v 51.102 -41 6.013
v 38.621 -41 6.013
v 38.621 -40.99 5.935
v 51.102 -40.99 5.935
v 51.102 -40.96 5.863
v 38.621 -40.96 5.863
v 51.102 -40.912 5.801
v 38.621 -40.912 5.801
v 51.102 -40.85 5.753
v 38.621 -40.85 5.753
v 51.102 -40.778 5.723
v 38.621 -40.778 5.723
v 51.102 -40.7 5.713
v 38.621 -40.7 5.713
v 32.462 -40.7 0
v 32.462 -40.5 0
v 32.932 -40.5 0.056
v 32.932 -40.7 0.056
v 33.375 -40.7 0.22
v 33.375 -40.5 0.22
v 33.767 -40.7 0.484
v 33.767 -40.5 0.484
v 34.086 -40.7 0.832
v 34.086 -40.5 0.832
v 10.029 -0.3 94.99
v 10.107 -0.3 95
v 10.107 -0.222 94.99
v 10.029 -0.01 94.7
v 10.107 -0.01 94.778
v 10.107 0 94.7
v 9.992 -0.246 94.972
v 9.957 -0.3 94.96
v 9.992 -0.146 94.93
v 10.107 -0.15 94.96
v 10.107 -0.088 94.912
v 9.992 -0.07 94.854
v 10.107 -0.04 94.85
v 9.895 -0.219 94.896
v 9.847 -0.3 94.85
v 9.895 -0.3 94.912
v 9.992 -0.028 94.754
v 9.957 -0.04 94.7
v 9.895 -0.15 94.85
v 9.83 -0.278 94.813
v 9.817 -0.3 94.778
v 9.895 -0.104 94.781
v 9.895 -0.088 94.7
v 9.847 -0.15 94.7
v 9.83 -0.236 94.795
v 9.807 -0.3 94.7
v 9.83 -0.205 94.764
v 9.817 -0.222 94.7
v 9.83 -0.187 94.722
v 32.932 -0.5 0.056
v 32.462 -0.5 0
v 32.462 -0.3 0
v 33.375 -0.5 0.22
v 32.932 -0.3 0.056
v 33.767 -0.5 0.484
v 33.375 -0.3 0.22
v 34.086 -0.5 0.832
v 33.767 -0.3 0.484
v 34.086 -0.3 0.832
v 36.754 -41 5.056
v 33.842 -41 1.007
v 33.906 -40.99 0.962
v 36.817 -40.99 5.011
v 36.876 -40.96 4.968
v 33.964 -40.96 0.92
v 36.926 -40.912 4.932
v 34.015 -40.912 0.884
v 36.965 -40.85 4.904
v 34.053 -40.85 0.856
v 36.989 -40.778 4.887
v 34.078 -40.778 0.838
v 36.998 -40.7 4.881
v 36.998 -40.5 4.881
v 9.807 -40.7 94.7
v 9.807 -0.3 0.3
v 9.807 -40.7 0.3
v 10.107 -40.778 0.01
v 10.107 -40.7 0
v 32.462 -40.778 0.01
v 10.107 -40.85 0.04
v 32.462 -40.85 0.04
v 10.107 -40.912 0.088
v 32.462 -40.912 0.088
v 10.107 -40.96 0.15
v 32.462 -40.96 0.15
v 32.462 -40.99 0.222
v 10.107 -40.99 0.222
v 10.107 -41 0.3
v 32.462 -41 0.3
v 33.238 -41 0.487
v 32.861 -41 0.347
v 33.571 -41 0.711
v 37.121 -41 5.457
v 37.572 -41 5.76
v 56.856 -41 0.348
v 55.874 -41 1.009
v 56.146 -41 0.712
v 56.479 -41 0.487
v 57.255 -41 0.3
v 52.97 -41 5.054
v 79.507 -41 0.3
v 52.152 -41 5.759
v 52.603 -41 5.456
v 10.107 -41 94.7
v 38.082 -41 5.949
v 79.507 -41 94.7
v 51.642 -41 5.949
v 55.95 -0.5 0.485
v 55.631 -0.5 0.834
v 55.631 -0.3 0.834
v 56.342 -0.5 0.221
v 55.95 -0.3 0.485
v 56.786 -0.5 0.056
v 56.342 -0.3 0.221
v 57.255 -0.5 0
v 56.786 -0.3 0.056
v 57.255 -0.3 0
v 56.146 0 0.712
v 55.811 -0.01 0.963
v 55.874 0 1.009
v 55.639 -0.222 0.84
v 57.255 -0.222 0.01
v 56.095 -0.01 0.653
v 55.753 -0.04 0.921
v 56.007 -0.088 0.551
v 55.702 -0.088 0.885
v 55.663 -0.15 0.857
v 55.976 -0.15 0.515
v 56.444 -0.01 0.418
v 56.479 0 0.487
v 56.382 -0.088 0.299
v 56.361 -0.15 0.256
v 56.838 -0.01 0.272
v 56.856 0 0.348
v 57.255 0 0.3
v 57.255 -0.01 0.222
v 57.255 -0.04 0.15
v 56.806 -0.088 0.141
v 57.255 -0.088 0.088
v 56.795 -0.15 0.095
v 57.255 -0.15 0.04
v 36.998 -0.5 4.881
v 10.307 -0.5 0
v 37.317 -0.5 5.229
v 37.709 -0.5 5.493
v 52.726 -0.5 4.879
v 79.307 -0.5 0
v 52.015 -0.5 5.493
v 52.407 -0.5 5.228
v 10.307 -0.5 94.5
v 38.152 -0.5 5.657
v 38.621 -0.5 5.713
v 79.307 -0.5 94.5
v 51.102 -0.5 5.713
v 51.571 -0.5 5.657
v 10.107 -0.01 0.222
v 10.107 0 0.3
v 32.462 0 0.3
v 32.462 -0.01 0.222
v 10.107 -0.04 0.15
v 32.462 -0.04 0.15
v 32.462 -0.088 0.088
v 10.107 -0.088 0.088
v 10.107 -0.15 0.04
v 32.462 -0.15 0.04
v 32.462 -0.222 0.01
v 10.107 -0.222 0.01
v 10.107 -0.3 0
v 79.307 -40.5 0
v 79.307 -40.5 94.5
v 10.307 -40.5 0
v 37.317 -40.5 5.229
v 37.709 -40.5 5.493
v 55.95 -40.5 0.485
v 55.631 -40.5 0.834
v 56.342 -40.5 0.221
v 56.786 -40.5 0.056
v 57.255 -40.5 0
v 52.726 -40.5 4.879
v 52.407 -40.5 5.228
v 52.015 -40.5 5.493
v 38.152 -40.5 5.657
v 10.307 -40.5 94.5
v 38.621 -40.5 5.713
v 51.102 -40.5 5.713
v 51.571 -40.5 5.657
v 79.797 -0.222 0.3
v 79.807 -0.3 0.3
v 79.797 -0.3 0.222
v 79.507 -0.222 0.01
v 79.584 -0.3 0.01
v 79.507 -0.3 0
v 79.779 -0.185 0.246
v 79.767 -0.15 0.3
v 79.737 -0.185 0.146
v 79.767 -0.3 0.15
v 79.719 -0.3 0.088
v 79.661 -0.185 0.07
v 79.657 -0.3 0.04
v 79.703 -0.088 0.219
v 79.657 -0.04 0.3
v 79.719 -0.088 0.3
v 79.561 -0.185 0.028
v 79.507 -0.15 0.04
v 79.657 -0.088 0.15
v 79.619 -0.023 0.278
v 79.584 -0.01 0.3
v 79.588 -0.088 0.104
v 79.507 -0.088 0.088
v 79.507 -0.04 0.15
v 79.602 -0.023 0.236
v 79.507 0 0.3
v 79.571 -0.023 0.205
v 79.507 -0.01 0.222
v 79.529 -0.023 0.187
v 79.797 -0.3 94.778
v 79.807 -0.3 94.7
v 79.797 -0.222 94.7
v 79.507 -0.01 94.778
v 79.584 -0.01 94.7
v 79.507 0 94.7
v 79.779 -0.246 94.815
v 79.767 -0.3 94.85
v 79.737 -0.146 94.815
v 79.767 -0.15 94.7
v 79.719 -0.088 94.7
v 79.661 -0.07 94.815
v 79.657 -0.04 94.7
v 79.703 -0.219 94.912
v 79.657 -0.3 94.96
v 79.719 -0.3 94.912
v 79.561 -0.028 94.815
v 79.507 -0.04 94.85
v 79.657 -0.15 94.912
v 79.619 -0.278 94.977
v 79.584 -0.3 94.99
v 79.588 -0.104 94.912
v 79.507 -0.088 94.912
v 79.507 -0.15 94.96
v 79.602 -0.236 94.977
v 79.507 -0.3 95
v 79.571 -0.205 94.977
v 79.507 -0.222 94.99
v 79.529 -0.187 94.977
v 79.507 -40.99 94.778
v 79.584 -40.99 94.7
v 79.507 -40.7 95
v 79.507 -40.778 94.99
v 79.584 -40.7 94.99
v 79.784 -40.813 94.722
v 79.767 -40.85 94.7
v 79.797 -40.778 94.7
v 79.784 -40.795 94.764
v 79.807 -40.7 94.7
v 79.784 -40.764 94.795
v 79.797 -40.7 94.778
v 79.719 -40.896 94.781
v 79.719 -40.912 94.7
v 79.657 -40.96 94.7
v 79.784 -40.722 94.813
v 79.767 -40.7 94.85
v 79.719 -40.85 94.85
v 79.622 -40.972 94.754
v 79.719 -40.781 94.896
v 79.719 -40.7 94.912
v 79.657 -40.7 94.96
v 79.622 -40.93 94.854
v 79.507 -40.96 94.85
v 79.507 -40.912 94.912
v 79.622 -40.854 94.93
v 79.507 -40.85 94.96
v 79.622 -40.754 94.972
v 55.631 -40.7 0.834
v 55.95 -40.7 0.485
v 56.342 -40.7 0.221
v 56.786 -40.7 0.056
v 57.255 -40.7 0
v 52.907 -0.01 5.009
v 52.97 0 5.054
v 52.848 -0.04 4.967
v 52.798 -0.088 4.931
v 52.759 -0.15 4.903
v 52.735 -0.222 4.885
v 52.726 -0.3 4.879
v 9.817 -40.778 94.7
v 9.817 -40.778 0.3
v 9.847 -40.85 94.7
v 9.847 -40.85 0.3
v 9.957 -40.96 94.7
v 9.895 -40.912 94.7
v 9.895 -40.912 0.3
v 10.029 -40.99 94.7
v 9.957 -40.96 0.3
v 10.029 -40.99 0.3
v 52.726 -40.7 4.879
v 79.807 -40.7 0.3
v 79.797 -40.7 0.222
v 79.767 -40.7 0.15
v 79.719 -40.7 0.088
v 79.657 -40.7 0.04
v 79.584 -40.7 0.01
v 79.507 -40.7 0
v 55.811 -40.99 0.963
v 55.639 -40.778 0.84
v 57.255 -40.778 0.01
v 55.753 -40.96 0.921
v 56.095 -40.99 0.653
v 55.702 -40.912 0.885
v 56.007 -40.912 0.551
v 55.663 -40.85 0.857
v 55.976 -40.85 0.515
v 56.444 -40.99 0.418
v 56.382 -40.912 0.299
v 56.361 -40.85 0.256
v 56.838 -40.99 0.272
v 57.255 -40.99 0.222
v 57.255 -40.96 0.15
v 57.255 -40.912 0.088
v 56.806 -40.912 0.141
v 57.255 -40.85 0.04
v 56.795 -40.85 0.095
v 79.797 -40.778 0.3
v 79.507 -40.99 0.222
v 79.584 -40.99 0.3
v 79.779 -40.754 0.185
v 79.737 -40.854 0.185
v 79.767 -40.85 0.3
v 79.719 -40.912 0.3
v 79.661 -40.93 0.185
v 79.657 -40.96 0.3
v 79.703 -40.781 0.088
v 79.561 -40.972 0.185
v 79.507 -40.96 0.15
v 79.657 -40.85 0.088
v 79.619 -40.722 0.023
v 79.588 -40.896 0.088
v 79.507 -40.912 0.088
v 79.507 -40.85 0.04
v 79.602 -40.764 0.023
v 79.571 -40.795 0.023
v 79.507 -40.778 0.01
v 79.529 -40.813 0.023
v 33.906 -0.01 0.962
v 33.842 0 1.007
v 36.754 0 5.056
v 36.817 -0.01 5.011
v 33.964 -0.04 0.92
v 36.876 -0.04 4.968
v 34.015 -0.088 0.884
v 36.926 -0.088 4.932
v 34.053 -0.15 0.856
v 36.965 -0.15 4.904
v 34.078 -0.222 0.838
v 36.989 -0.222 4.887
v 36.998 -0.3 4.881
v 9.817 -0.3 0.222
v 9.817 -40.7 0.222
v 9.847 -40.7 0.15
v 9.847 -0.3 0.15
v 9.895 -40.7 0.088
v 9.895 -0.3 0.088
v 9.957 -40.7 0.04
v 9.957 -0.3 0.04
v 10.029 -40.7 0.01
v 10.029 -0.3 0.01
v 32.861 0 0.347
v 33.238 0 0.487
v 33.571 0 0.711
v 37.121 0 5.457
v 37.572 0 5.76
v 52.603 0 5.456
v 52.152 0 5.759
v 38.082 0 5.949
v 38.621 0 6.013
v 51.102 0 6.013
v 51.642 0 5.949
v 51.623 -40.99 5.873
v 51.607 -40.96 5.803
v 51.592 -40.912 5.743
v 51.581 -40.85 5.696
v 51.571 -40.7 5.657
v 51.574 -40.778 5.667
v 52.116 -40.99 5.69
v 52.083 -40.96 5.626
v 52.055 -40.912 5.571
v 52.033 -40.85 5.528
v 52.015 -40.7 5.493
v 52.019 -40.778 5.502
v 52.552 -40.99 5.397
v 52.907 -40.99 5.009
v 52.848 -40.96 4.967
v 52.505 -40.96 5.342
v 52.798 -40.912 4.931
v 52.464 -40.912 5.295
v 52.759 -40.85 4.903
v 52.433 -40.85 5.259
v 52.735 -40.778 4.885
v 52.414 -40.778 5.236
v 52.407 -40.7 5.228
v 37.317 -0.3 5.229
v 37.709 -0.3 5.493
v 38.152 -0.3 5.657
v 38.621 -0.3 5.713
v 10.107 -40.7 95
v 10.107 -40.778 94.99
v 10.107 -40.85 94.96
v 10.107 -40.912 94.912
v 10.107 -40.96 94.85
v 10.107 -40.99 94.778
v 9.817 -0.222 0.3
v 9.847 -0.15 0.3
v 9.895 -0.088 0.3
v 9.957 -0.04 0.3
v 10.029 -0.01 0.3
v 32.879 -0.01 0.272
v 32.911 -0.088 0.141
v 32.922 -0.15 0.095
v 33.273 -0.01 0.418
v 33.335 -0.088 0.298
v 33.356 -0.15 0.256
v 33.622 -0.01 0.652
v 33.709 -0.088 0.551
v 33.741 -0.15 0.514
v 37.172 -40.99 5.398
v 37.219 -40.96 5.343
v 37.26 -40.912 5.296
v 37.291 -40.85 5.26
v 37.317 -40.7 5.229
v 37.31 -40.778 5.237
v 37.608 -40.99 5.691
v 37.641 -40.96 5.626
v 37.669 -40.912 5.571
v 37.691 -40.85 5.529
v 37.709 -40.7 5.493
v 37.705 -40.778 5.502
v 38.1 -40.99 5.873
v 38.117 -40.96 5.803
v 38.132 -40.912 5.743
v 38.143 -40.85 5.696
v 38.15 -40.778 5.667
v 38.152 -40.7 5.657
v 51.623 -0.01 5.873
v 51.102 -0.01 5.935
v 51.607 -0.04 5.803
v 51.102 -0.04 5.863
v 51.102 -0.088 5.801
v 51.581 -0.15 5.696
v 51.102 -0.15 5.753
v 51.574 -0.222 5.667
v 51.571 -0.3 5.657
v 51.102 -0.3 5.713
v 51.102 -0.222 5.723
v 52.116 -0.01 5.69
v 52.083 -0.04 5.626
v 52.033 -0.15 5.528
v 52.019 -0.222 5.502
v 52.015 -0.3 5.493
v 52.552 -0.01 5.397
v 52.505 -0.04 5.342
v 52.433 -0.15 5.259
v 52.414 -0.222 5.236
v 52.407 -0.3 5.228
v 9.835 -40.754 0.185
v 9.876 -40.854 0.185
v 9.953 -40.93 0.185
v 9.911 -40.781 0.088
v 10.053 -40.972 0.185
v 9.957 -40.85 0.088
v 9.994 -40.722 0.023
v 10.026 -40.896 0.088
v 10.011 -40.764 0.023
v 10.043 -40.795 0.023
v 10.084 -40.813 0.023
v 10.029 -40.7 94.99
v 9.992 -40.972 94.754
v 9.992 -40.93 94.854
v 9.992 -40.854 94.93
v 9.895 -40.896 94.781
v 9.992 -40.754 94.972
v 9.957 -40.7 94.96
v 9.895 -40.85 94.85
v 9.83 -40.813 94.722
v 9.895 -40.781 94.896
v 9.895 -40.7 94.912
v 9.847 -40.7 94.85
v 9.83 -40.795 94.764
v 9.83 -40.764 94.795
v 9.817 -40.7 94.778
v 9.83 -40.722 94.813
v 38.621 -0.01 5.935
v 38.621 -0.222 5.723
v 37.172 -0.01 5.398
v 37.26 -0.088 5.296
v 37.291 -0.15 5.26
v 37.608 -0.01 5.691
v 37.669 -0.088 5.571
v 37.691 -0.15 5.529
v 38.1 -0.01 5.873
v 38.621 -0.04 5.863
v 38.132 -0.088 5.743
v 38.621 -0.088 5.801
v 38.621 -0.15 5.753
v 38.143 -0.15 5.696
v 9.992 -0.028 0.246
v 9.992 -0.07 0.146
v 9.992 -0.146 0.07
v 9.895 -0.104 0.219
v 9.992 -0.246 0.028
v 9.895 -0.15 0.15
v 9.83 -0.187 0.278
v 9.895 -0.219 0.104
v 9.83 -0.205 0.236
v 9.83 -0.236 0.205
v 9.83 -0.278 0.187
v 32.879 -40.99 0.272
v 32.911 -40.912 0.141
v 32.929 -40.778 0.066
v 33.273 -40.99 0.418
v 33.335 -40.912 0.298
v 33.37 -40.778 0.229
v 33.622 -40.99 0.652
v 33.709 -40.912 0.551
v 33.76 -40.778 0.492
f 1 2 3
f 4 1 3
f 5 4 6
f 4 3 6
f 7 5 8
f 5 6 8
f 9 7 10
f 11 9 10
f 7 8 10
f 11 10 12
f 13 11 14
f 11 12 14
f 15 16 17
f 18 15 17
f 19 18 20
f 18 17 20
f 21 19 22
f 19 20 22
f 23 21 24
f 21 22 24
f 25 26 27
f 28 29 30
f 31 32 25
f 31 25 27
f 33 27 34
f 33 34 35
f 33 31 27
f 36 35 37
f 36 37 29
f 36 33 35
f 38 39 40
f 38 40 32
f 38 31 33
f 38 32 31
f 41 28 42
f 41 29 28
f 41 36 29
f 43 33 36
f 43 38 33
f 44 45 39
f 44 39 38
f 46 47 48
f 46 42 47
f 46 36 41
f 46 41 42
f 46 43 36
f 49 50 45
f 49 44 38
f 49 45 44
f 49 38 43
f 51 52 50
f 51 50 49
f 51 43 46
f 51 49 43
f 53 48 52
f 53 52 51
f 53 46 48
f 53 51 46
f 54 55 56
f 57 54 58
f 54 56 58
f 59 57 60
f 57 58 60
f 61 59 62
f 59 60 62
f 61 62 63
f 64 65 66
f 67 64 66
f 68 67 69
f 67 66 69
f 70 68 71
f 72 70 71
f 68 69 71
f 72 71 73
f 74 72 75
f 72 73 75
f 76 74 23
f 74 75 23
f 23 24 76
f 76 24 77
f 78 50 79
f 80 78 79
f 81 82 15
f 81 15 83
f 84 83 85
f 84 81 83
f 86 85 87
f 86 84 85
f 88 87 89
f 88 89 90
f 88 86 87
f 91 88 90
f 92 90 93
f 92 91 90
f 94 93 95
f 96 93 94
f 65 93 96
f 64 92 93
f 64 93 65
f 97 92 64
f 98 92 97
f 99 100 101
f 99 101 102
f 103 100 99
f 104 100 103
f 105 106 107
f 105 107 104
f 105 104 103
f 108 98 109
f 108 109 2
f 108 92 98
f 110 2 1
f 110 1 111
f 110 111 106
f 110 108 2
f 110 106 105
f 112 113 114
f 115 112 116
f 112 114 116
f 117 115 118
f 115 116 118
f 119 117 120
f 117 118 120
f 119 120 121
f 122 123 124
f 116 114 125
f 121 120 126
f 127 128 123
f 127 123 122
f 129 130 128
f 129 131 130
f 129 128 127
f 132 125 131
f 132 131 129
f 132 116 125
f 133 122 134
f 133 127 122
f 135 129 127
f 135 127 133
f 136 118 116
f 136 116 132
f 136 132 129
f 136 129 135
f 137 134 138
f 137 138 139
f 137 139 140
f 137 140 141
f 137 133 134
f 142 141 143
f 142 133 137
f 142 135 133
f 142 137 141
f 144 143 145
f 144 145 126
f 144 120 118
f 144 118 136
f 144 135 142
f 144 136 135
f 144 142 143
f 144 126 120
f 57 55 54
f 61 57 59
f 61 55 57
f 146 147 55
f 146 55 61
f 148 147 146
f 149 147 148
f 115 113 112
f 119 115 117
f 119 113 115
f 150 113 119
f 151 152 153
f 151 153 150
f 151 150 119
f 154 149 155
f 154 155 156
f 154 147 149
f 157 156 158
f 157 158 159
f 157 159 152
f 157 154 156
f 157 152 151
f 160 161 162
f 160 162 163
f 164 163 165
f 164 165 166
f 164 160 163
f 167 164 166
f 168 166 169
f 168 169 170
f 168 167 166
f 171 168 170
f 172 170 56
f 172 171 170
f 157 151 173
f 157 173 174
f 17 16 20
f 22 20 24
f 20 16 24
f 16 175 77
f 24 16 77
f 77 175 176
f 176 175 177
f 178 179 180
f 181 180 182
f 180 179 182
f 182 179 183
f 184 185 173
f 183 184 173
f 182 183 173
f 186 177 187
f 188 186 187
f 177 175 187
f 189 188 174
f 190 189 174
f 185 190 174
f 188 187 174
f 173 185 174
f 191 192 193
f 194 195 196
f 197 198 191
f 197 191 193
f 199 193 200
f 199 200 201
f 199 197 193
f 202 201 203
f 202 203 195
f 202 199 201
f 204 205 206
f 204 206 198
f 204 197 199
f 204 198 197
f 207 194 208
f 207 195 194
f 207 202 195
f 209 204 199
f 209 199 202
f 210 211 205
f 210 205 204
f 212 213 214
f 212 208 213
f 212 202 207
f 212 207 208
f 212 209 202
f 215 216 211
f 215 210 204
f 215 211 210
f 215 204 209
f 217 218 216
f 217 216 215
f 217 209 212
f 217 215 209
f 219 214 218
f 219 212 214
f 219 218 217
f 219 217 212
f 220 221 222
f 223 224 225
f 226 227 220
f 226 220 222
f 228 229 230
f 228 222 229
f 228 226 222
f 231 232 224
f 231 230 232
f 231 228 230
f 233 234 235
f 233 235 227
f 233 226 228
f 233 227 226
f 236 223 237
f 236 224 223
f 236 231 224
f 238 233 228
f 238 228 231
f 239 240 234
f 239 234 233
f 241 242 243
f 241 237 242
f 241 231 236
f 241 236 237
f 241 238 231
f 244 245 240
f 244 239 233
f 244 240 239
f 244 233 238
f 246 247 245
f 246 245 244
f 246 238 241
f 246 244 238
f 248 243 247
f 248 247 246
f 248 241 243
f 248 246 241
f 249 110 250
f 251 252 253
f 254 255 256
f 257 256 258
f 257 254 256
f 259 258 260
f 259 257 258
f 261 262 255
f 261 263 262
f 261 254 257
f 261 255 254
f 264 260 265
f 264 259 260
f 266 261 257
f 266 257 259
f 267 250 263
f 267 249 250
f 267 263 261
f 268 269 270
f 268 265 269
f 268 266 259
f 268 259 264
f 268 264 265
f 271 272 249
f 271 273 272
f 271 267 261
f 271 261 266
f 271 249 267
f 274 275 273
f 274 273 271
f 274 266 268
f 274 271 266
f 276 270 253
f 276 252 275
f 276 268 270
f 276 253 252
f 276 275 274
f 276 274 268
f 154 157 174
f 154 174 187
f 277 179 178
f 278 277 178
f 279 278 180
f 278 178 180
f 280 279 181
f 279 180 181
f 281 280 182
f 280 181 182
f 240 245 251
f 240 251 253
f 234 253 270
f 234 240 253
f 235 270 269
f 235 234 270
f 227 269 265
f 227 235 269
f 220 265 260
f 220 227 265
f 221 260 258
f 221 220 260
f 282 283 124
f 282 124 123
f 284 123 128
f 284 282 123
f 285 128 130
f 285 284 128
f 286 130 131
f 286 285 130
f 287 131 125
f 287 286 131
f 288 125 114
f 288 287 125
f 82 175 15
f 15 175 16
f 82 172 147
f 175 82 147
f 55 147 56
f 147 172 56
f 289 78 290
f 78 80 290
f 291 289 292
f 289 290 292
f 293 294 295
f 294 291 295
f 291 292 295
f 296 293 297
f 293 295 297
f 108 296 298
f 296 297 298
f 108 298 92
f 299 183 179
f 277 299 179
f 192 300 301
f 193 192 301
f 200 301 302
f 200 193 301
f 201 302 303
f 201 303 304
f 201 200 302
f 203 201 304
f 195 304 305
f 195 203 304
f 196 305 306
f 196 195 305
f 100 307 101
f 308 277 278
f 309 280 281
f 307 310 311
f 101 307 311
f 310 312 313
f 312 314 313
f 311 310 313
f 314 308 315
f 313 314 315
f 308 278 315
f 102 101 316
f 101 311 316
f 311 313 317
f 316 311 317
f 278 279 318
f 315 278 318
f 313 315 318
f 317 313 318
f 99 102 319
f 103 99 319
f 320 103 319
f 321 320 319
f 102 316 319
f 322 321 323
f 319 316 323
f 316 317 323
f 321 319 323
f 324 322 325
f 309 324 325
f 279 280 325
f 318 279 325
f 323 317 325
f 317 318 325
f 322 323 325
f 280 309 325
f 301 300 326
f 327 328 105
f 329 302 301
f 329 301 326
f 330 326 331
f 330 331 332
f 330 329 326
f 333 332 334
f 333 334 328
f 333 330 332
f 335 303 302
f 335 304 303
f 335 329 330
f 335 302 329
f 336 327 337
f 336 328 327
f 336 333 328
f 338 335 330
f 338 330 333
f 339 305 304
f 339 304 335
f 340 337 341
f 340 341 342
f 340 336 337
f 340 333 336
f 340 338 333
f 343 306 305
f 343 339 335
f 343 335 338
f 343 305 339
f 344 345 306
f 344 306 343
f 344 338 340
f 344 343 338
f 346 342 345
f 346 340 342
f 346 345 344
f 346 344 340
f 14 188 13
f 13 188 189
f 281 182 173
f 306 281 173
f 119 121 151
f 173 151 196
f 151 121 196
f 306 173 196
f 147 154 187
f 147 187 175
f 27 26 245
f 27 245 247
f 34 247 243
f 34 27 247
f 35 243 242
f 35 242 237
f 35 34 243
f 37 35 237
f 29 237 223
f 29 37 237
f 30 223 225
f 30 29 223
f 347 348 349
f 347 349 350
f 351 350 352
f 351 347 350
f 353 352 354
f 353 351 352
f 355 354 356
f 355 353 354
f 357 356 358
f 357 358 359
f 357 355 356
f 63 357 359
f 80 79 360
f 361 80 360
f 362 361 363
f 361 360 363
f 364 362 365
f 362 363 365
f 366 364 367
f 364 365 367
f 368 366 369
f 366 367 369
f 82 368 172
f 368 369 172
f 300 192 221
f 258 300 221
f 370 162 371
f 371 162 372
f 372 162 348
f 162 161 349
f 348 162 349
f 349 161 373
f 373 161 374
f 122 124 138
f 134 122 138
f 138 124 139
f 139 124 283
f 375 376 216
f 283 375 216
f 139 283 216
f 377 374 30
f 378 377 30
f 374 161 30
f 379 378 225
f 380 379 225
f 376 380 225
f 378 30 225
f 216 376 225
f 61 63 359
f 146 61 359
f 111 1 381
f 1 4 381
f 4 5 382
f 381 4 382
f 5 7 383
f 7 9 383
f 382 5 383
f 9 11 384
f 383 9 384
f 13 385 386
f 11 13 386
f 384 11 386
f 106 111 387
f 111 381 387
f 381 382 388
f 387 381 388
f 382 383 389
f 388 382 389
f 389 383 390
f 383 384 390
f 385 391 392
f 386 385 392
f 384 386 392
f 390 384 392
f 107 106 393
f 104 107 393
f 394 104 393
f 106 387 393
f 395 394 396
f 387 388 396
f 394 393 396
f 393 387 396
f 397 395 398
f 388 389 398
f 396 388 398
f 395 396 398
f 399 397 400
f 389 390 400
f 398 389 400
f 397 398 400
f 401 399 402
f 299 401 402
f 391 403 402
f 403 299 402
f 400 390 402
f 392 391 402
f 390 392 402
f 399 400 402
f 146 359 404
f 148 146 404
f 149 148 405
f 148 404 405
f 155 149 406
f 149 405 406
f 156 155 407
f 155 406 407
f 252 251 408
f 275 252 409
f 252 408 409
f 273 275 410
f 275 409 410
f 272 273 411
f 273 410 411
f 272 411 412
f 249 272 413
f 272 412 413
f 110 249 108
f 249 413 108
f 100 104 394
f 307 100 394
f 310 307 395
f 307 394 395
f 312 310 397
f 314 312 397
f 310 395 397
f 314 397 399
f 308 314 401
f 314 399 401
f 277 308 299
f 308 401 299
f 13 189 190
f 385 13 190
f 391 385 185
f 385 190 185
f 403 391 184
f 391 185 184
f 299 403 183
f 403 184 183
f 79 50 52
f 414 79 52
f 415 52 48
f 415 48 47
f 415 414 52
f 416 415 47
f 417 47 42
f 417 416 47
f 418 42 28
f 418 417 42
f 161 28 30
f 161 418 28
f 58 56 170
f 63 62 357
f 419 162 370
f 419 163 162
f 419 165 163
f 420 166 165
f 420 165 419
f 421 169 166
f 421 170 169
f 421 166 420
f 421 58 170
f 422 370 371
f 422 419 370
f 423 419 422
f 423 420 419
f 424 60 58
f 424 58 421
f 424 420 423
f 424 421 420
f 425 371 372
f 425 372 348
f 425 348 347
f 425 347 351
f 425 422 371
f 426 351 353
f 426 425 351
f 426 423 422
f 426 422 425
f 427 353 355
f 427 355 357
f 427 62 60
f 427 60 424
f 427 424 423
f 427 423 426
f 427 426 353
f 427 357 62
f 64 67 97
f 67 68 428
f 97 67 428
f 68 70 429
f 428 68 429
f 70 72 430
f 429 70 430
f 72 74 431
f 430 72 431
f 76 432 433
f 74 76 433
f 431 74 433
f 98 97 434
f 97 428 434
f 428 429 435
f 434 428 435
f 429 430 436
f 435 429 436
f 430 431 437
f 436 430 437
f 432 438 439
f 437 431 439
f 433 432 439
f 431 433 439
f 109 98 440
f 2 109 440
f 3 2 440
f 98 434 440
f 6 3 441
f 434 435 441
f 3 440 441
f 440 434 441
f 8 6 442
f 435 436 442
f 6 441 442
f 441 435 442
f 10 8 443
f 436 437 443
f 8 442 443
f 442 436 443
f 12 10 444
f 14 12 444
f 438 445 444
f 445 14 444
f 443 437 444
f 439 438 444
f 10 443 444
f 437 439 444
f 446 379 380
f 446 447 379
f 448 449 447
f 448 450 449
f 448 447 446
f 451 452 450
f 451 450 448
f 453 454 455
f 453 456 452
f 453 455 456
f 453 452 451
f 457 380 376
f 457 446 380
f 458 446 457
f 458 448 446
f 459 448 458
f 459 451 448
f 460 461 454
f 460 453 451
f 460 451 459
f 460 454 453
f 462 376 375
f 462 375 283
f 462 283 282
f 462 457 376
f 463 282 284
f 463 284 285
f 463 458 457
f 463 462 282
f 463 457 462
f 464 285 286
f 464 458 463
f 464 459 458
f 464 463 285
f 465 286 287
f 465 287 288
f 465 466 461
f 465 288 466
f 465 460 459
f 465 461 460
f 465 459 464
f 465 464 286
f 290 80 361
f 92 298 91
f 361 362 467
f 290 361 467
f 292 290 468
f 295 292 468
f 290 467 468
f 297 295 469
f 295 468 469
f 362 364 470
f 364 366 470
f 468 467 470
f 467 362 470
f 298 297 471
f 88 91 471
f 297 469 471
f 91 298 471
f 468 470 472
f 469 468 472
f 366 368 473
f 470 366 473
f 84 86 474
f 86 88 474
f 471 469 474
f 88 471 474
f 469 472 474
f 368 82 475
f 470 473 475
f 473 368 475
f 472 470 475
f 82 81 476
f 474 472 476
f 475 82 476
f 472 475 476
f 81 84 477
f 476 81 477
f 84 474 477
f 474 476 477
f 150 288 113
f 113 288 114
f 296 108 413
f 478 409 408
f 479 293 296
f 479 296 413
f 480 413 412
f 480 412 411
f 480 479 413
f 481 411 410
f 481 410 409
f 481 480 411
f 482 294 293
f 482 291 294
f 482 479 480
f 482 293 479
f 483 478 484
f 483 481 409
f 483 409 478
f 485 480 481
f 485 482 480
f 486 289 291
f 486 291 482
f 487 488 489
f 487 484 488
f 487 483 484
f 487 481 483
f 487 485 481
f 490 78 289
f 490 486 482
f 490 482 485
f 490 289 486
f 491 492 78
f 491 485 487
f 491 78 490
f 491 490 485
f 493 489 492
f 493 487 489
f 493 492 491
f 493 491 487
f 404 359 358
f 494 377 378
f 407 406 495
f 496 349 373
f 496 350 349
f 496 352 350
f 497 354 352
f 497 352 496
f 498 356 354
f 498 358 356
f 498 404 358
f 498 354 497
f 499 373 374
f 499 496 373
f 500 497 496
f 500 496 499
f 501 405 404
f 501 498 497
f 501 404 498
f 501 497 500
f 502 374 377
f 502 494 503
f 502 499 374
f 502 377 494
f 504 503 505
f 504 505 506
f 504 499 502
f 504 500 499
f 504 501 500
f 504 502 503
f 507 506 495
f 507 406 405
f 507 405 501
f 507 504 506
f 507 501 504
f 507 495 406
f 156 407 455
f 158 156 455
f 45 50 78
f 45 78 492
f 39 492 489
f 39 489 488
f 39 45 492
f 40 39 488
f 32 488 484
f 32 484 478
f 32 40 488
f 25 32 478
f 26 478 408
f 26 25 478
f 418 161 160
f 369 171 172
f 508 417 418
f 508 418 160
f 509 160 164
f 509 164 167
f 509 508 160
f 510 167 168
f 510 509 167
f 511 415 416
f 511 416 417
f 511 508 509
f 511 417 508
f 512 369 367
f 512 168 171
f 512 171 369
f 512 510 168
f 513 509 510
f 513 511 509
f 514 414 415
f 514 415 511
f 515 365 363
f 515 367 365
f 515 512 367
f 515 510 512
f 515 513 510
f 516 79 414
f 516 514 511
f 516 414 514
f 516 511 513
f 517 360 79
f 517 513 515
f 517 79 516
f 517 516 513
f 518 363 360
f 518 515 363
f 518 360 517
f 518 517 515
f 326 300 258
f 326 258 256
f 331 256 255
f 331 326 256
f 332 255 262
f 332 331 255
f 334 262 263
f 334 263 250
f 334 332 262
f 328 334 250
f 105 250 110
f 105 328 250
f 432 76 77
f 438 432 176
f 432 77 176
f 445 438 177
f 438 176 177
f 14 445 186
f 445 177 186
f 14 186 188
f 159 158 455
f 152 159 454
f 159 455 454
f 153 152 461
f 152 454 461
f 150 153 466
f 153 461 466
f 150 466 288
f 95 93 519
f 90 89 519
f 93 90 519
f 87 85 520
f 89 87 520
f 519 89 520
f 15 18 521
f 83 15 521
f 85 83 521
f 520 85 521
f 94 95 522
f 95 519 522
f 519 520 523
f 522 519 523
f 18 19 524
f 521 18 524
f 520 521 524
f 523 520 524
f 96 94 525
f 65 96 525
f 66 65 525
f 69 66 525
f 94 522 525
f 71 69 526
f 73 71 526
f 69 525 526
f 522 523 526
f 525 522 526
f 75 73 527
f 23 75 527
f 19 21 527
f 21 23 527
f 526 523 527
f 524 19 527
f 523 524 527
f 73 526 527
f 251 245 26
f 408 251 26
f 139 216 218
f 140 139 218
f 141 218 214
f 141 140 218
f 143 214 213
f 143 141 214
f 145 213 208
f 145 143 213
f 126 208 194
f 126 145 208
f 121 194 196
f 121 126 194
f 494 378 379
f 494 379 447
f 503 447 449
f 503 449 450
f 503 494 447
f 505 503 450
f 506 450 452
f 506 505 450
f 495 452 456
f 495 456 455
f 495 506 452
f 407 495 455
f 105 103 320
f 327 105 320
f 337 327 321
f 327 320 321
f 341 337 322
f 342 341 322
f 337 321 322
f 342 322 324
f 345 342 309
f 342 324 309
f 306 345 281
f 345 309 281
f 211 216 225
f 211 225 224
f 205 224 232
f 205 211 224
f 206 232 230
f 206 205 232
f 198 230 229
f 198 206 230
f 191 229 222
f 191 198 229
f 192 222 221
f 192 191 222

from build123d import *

# Parameters (mm, degrees)
F1_DEPTH     = 41
F2_T         = -0.5
F3_R         = 0.3
F4_T1_DEPTH  = 40.4
F4_T3_DEPTH  = 69.4
F4_T5_DEPTH  = 94.4
F4_T7_DEPTH  = 22.3555421914
F4_T9_DEPTH  = 4.9869624773
F4_T11_DEPTH = 22.2513779286
F4_T13_DEPTH = 12.4801482885
F4_T15_DEPTH = 4.9803706459
F4_S19_W     = 0.3
F4_S19_H     = 0.3
F4_T20_DEPTH = 0.3
F4_S25_W     = 0.3
F4_S25_H     = 0.3
F4_T26_DEPTH = 0.3
F4_S31_W     = 0.3
F4_S31_H     = 0.3
F4_T32_DEPTH = 0.3
F4_S37_W     = 0.3
F4_S37_H     = 0.3
F4_T38_DEPTH = 0.3
F4_S43_W     = 0.3
F4_S43_H     = 0.3
F4_T44_DEPTH = 0.3
F4_S49_W     = 0.3
F4_S49_H     = 0.3
F4_T50_DEPTH = 0.3
F4_T54_ANGLE = 54.2765520119
F4_T56_ANGLE = 54.2765520119
F4_T58_ANGLE = 54.2765520119
F4_T60_ANGLE = 54.3263722655
F4_T62_ANGLE = 54.3263722655
F4_T64_ANGLE = 54.3263722655
F4_T66_ANGLE = 54.3263722655
F4_T68_ANGLE = 54.2765520119
F4_T70_ANGLE = 90
F4_T72_ANGLE = 90


# Not quite as in the source:
# - a fillet or chamfer that OpenCascade refuses, or shapes differently, is made with other operations: its cross-section is extruded or revolved along the edge and cut away or added
# - a feature names something its author has since deleted; it is built from what else it names


with BuildPart() as f1:
    # F0 (on Front) → F1 (new body)
    with BuildSketch(Plane.XZ):
        with BuildLine():
            Line((9.8067959771, 95), (9.8067959771, 0))
            Line((9.8067959771, 0), (32.4623381684, 0))
            ThreePointArc((32.4623381684, 0), (33.3746171792, 0.2201834346), (34.086027464, 0.8322529934))
            Line((34.086027464, 0.8322529934), (36.9977827164, 4.8808917895))
            ThreePointArc((36.9977827164, 4.8808917895), (37.7091930013, 5.4929613484), (38.621472012, 5.7131447829))
            Line((38.621472012, 5.7131447829), (44.8583289981, 5.7131447829))
            Line((44.8583289981, 5.7131447829), (51.1016203005, 5.7131447829))
            ThreePointArc((51.1016203005, 5.7131447829), (52.0146730247, 5.4925645543), (52.7263243702, 4.8794795058))
            Line((52.7263243702, 4.8794795058), (55.6307139787, 0.8336652772))
            ThreePointArc((55.6307139787, 0.8336652772), (56.3423653243, 0.2205802286), (57.2554180484, 0))
            Line((57.2554180484, 0), (79.8067959771, 0))
            Line((79.8067959771, 0), (79.8067959771, 95))
            Line((79.8067959771, 95), (9.8067959771, 95))
        make_face()
    extrude(amount=F1_DEPTH)

    # F2
    f2_openings = [f1.faces().sort_by_distance(p)[0] for p in [
        (21.134567, -20.5, 0),
        (33.374617, -20.5, 0.220183),
        (35.541905, -20.5, 2.856572),
        (37.709193, -20.5, 5.492961),
        (44.861546, -20.5, 5.713145),
        (52.014673, -20.5, 5.492565),
        (56.342365, -20.5, 0.22058),
        (68.531107, -20.5, 0),
        (54.178519, -20.5, 2.856572),
    ]]
    offset(amount=F2_T, openings=f2_openings)

    # F3
    f3_edges = [f1.edges().sort_by_distance(p)[0] for p in [
        (44.806796, -41, 95),
        (9.806796, -41, 47.5),
    ]]
    fillet(f3_edges, radius=F3_R)

    # F4: fillet of radius 0.3 on 11 edges, made by hand

    # F4_s2 → F4_t1 (cut)
    with BuildSketch(Plane.XZ.offset(0.3)):
        with BuildLine():
            ThreePointArc((9.8067959771, 94.7), (9.8946639427, 94.9121320344), (10.1067959771, 95))
            Line((10.1067959771, 95), (9.8067959771, 95))
            Line((9.8067959771, 95), (9.8067959771, 94.7))
        make_face()
        with BuildLine():
            ThreePointArc((79.5067959771, 95), (79.7189280114, 94.9121320344), (79.8067959771, 94.7))
            Line((79.8067959771, 94.7), (79.8067959771, 95))
            Line((79.8067959771, 95), (79.5067959771, 95))
        make_face()
        with BuildLine():
            ThreePointArc((79.8067959771, 0.3), (79.7189280114, 0.0878679656), (79.5067959771, 0))
            Line((79.5067959771, 0), (79.8067959771, 0))
            Line((79.8067959771, 0), (79.8067959771, 0.3))
        make_face()
        with BuildLine():
            ThreePointArc((9.8067959771, 0.3), (9.8946639427, 0.0878679656), (10.1067959771, 0))
            Line((10.1067959771, 0), (9.8067959771, 0))
            Line((9.8067959771, 0), (9.8067959771, 0.3))
        make_face()
    extrude(amount=F4_T1_DEPTH, mode=Mode.SUBTRACT)

    # F4_s4 → F4_t3 (cut)
    with BuildSketch(Plane.YZ.offset(10.1067959771)):
        with BuildLine():
            ThreePointArc((-0.3, 95), (-0.0878679656, 94.9121320344), (0, 94.7))
            Line((0, 94.7), (0, 95))
            Line((0, 95), (-0.3, 95))
        make_face()
    extrude(amount=F4_T3_DEPTH, mode=Mode.SUBTRACT)

    # F4_s6 → F4_t5 (cut)
    with BuildSketch(Plane.XY.offset(0.3)):
        with BuildLine():
            ThreePointArc((9.8067959771, -0.3), (9.8946639427, -0.0878679656), (10.1067959771, 0))
            Line((10.1067959771, 0), (9.8067959771, 0))
            Line((9.8067959771, 0), (9.8067959771, -0.3))
        make_face()
        with BuildLine():
            ThreePointArc((79.5067959771, 0), (79.7189280114, -0.0878679656), (79.8067959771, -0.3))
            Line((79.8067959771, -0.3), (79.8067959771, 0))
            Line((79.8067959771, 0), (79.5067959771, 0))
        make_face()
        with BuildLine():
            ThreePointArc((79.8067959771, -40.7), (79.7189280114, -40.9121320344), (79.5067959771, -41))
            Line((79.5067959771, -41), (79.8067959771, -41))
            Line((79.8067959771, -41), (79.8067959771, -40.7))
        make_face()
    extrude(amount=F4_T5_DEPTH, mode=Mode.SUBTRACT)

    # F4_s8 → F4_t7 (cut)
    with BuildSketch(Plane.YZ.offset(10.1067959771)):
        with BuildLine():
            ThreePointArc((-40.7, 0), (-40.9121320344, 0.0878679656), (-41, 0.3))
            Line((-41, 0.3), (-41, 0))
            Line((-41, 0), (-40.7, 0))
        make_face()
        with BuildLine():
            ThreePointArc((0, 0.3), (-0.0878679656, 0.0878679656), (-0.3, 0))
            Line((-0.3, 0), (0, 0))
            Line((0, 0), (0, 0.3))
        make_face()
    extrude(amount=F4_T7_DEPTH, mode=Mode.SUBTRACT)

    # F4_s10 → F4_t9 (cut)
    with BuildSketch(Plane(origin=(12.0147086319, 0, 16.7058050126), x_dir=(0, 1, 0), z_dir=(0.5838735033, 0, 0.8118446478))):
        with BuildLine():
            ThreePointArc((-41, -26.8866284908), (-40.9121320344, -27.0987605251), (-40.7, -27.1866284908))
            Line((-40.7, -27.1866284908), (-41, -27.1866284908))
            Line((-41, -27.1866284908), (-41, -26.8866284908))
        make_face()
        with BuildLine():
            ThreePointArc((0, -26.8866284908), (-0.0878679656, -27.0987605251), (-0.3, -27.1866284908))
            Line((-0.3, -27.1866284908), (0, -27.1866284908))
            Line((0, -27.1866284908), (0, -26.8866284908))
        make_face()
    extrude(amount=F4_T9_DEPTH, mode=Mode.SUBTRACT)

    # F4_s12 → F4_t11 (cut)
    with BuildSketch(Plane.YZ.offset(57.2554180484)):
        with BuildLine():
            ThreePointArc((-41, 0.3), (-40.9121320344, 0.0878679656), (-40.7, 0))
            Line((-40.7, 0), (-41, 0))
            Line((-41, 0), (-41, 0.3))
        make_face()
        with BuildLine():
            ThreePointArc((0, 0.3), (-0.0878679656, 0.0878679656), (-0.3, 0))
            Line((-0.3, 0), (0, 0))
            Line((0, 0), (0, 0.3))
        make_face()
    extrude(amount=F4_T11_DEPTH, mode=Mode.SUBTRACT)

    # F4_s14 → F4_t13 (cut)
    with BuildSketch(Plane.YZ.offset(38.621472012)):
        with BuildLine():
            ThreePointArc((0, 6.0131447829), (-0.0878679656, 5.8010127486), (-0.3, 5.7131447829))
            Line((-0.3, 5.7131447829), (0, 5.7131447829))
            Line((0, 5.7131447829), (0, 6.0131447829))
        make_face()
        with BuildLine():
            ThreePointArc((-41, 6.0131447829), (-40.9121320344, 5.8010127486), (-40.7, 5.7131447829))
            Line((-40.7, 5.7131447829), (-41, 5.7131447829))
            Line((-41, 5.7131447829), (-41, 6.0131447829))
        make_face()
    extrude(amount=F4_T13_DEPTH, mode=Mode.SUBTRACT)

    # F4_s16 → F4_t15 (cut)
    with BuildSketch(Plane(origin=(15.6197974129, 0, -21.7583751289), x_dir=(0, 1, 0), z_dir=(0.5831673614, 0, -0.8123520349))):
        with BuildLine():
            ThreePointArc((0, 45.9778900823), (-0.0878679656, 45.765758048), (-0.3, 45.6778900823))
            Line((-0.3, 45.6778900823), (0, 45.6778900823))
            Line((0, 45.6778900823), (0, 45.9778900823))
        make_face()
        with BuildLine():
            ThreePointArc((-41, 45.9778900823), (-40.9121320344, 45.765758048), (-40.7, 45.6778900823))
            Line((-40.7, 45.6778900823), (-41, 45.6778900823))
            Line((-41, 45.6778900823), (-41, 45.9778900823))
        make_face()
    extrude(amount=F4_T15_DEPTH, mode=Mode.SUBTRACT)


with BuildPart() as f4_tool18:
    # F4_s19 → F4_t20 (new body)
    with BuildSketch(Plane.YZ.offset(10.1067959771)):
        with Locations((-40.85, 94.85)):
            Rectangle(F4_S19_W, F4_S19_H)
    extrude(amount=-F4_T20_DEPTH)

    # F4_s21 → F4_t22 (revolve, cut)
    with BuildSketch(Plane(origin=(10.1067959771, -40.7, 94.7), x_dir=(0, 0.7071067812, -0.7071067812), z_dir=(0, 0.7071067812, 0.7071067812))):
        with BuildLine():
            ThreePointArc((0, -0.3), (0.3, 0), (0, 0.3))
            Line((0, 0.3), (0, -0.3))
        make_face()
    revolve(axis=Axis((10.1067959771, -40.7, 94.7), (-1, 0, 0)), mode=Mode.SUBTRACT)


with BuildPart() as f1_1:
    add(f1.part)

    # F4_t17: cut F4_tool18
    add(f4_tool18.part, mode=Mode.SUBTRACT)


with BuildPart() as f4_tool24:
    # F4_s25 → F4_t26 (new body)
    with BuildSketch(Plane.YZ.offset(10.1067959771)):
        with Locations((-0.15, 94.85)):
            Rectangle(F4_S25_W, F4_S25_H)
    extrude(amount=-F4_T26_DEPTH)

    # F4_s27 → F4_t28 (revolve, cut)
    with BuildSketch(Plane(origin=(10.1067959771, -0.3, 94.7), x_dir=(0, -0.7071067812, -0.7071067812), z_dir=(0, 0.7071067812, -0.7071067812))):
        with BuildLine():
            ThreePointArc((0, -0.3), (0.3, 0), (0, 0.3))
            Line((0, 0.3), (0, -0.3))
        make_face()
    revolve(axis=Axis((10.1067959771, -0.3, 94.7), (-1, 0, 0)), mode=Mode.SUBTRACT)


with BuildPart() as f1_2:
    add(f1_1.part)

    # F4_t23: cut F4_tool24
    add(f4_tool24.part, mode=Mode.SUBTRACT)


with BuildPart() as f4_tool30:
    # F4_s31 → F4_t32 (new body)
    with BuildSketch(Plane.XY.offset(94.7)):
        with Locations((79.6567959771, -0.15)):
            Rectangle(F4_S31_W, F4_S31_H)
    extrude(amount=F4_T32_DEPTH)

    # F4_s33 → F4_t34 (revolve, cut)
    with BuildSketch(Plane(origin=(79.5067959771, -0.3, 94.7), x_dir=(-0.7071067812, -0.7071067812, 0), z_dir=(-0.7071067812, 0.7071067812, 0))):
        with BuildLine():
            ThreePointArc((0, -0.3), (0.3, 0), (0, 0.3))
            Line((0, 0.3), (0, -0.3))
        make_face()
    revolve(axis=Axis((79.5067959771, -0.3, 94.7), (0, 0, 1)), mode=Mode.SUBTRACT)


with BuildPart() as f1_3:
    add(f1_2.part)

    # F4_t29: cut F4_tool30
    add(f4_tool30.part, mode=Mode.SUBTRACT)


with BuildPart() as f4_tool36:
    # F4_s37 → F4_t38 (new body)
    with BuildSketch(Plane.YZ.offset(10.1067959771)):
        with Locations((-0.15, 0.15)):
            Rectangle(F4_S37_W, F4_S37_H)
    extrude(amount=-F4_T38_DEPTH)

    # F4_s39 → F4_t40 (revolve, cut)
    with BuildSketch(Plane(origin=(10.1067959771, -0.3, 0.3), x_dir=(0, -0.7071067812, 0.7071067812), z_dir=(0, -0.7071067812, -0.7071067812))):
        with BuildLine():
            ThreePointArc((0, -0.3), (0.3, 0), (0, 0.3))
            Line((0, 0.3), (0, -0.3))
        make_face()
    revolve(axis=Axis((10.1067959771, -0.3, 0.3), (-1, 0, 0)), mode=Mode.SUBTRACT)


with BuildPart() as f1_4:
    add(f1_3.part)

    # F4_t35: cut F4_tool36
    add(f4_tool36.part, mode=Mode.SUBTRACT)


with BuildPart() as f4_tool42:
    # F4_s43 → F4_t44 (new body)
    with BuildSketch(Plane.XZ.offset(0.3)):
        with Locations((79.6567959771, 0.15)):
            Rectangle(F4_S43_W, F4_S43_H)
    extrude(amount=-F4_T44_DEPTH)

    # F4_s45 → F4_t46 (revolve, cut)
    with BuildSketch(Plane(origin=(79.5067959771, -0.3, 0.3), x_dir=(-0.7071067812, 0, 0.7071067812), z_dir=(-0.7071067812, 0, -0.7071067812))):
        with BuildLine():
            ThreePointArc((0, -0.3), (0.3, 0), (0, 0.3))
            Line((0, 0.3), (0, -0.3))
        make_face()
    revolve(axis=Axis((79.5067959771, -0.3, 0.3), (0, 1, 0)), mode=Mode.SUBTRACT)


with BuildPart() as f1_5:
    add(f1_4.part)

    # F4_t41: cut F4_tool42
    add(f4_tool42.part, mode=Mode.SUBTRACT)


with BuildPart() as f4_tool48:
    # F4_s49 → F4_t50 (new body)
    with BuildSketch(Plane.XY.offset(0.3)):
        with Locations((79.6567959771, -40.85)):
            Rectangle(F4_S49_W, F4_S49_H)
    extrude(amount=-F4_T50_DEPTH)

    # F4_s51 → F4_t52 (revolve, cut)
    with BuildSketch(Plane(origin=(79.5067959771, -40.7, 0.3), x_dir=(-0.7071067812, 0.7071067812, 0), z_dir=(-0.7071067812, -0.7071067812, 0))):
        with BuildLine():
            ThreePointArc((0, -0.3), (0.3, 0), (0, 0.3))
            Line((0, 0.3), (0, -0.3))
        make_face()
    revolve(axis=Axis((79.5067959771, -40.7, 0.3), (0, 0, -1)), mode=Mode.SUBTRACT)


with BuildPart() as f1_6:
    add(f1_5.part)

    # F4_t47: cut F4_tool48
    add(f4_tool48.part, mode=Mode.SUBTRACT)

    # F4_s53 → F4_t54 (revolve, cut)
    with BuildSketch(Plane.YZ.offset(32.4623381684)):
        with BuildLine():
            ThreePointArc((-41, 0.3), (-40.9121320344, 0.0878679656), (-40.7, 0))
            Line((-40.7, 0), (-41, 0))
            Line((-41, 0), (-41, 0.3))
        make_face()
    revolve(axis=Axis((32.4623381684, -41, 2), (0, -1, 0)), revolution_arc=F4_T54_ANGLE, mode=Mode.SUBTRACT)

    # F4_s55 → F4_t56 (revolve, cut)
    with BuildSketch(Plane.YZ.offset(32.4623381684)):
        with BuildLine():
            ThreePointArc((0, 0.3), (-0.0878679656, 0.0878679656), (-0.3, 0))
            Line((-0.3, 0), (0, 0))
            Line((0, 0), (0, 0.3))
        make_face()
    revolve(axis=Axis((32.4623381684, 0, 2), (0, -1, 0)), revolution_arc=F4_T56_ANGLE, mode=Mode.SUBTRACT)

    # F4_s57 → F4_t58 (revolve, cut)
    with BuildSketch(Plane(origin=(14.9264638842, 0, 20.7544438086), x_dir=(0, 1, 0), z_dir=(-0.5838735033, 0, -0.8118446478))):
        with BuildLine():
            ThreePointArc((0, 26.8866284908), (-0.0878679656, 27.0987605251), (-0.3, 27.1866284908))
            Line((-0.3, 27.1866284908), (0, 27.1866284908))
            Line((0, 27.1866284908), (0, 26.8866284908))
        make_face()
    revolve(axis=Axis((38.621472012, 0, 3.7131447829), (0, 1, 0)), revolution_arc=F4_T58_ANGLE, mode=Mode.SUBTRACT)

    # F4_s59 → F4_t60 (revolve, cut)
    with BuildSketch(Plane.YZ.offset(51.1016203005)):
        with BuildLine():
            ThreePointArc((0, 6.0131447829), (-0.0878679656, 5.8010127486), (-0.3, 5.7131447829))
            Line((-0.3, 5.7131447829), (0, 5.7131447829))
            Line((0, 5.7131447829), (0, 6.0131447829))
        make_face()
    revolve(axis=Axis((51.1016203005, 0, 3.7131447829), (0, 1, 0)), revolution_arc=F4_T60_ANGLE, mode=Mode.SUBTRACT)

    # F4_s61 → F4_t62 (revolve, cut)
    with BuildSketch(Plane(origin=(18.5241870214, 0, -25.8041893575), x_dir=(0, 1, 0), z_dir=(-0.5831673614, 0, 0.8123520349))):
        with BuildLine():
            ThreePointArc((0, -45.9778900823), (-0.0878679656, -45.765758048), (-0.3, -45.6778900823))
            Line((-0.3, -45.6778900823), (0, -45.6778900823))
            Line((0, -45.6778900823), (0, -45.9778900823))
        make_face()
    revolve(axis=Axis((57.2554180484, 0, 2), (0, -1, 0)), revolution_arc=F4_T62_ANGLE, mode=Mode.SUBTRACT)

    # F4_s63 → F4_t64 (revolve, cut)
    with BuildSketch(Plane(origin=(18.5241870214, 0, -25.8041893575), x_dir=(0, 1, 0), z_dir=(-0.5831673614, 0, 0.8123520349))):
        with BuildLine():
            ThreePointArc((-41, -45.9778900823), (-40.9121320344, -45.765758048), (-40.7, -45.6778900823))
            Line((-40.7, -45.6778900823), (-41, -45.6778900823))
            Line((-41, -45.6778900823), (-41, -45.9778900823))
        make_face()
    revolve(axis=Axis((57.2554180484, -41, 2), (0, -1, 0)), revolution_arc=F4_T64_ANGLE, mode=Mode.SUBTRACT)

    # F4_s65 → F4_t66 (revolve, cut)
    with BuildSketch(Plane.YZ.offset(51.1016203005)):
        with BuildLine():
            ThreePointArc((-41, 6.0131447829), (-40.9121320344, 5.8010127486), (-40.7, 5.7131447829))
            Line((-40.7, 5.7131447829), (-41, 5.7131447829))
            Line((-41, 5.7131447829), (-41, 6.0131447829))
        make_face()
    revolve(axis=Axis((51.1016203005, -41, 3.7131447829), (0, 1, 0)), revolution_arc=F4_T66_ANGLE, mode=Mode.SUBTRACT)

    # F4_s67 → F4_t68 (revolve, cut)
    with BuildSketch(Plane(origin=(14.9264638842, 0, 20.7544438086), x_dir=(0, 1, 0), z_dir=(-0.5838735033, 0, -0.8118446478))):
        with BuildLine():
            ThreePointArc((-41, 26.8866284908), (-40.9121320344, 27.0987605251), (-40.7, 27.1866284908))
            Line((-40.7, 27.1866284908), (-41, 27.1866284908))
            Line((-41, 27.1866284908), (-41, 26.8866284908))
        make_face()
    revolve(axis=Axis((38.621472012, -41, 3.7131447829), (0, 1, 0)), revolution_arc=F4_T68_ANGLE, mode=Mode.SUBTRACT)

    # F4_s69 → F4_t70 (revolve, cut)
    with BuildSketch(Plane.XZ.offset(40.7)):
        with BuildLine():
            ThreePointArc((9.8067959771, 0.3), (9.8946639427, 0.0878679656), (10.1067959771, 0))
            Line((10.1067959771, 0), (9.8067959771, 0))
            Line((9.8067959771, 0), (9.8067959771, 0.3))
        make_face()
    revolve(axis=Axis((10.1067959771, -40.7, 0), (0, 0, 1)), revolution_arc=F4_T70_ANGLE, mode=Mode.SUBTRACT)

    # F4_s71 → F4_t72 (revolve, cut)
    with BuildSketch(Plane.XY.offset(94.7)):
        with BuildLine():
            ThreePointArc((79.8067959771, -40.7), (79.7189280114, -40.9121320344), (79.5067959771, -41))
            Line((79.5067959771, -41), (79.8067959771, -41))
            Line((79.8067959771, -41), (79.8067959771, -40.7))
        make_face()
    revolve(axis=Axis((79.8067959771, -40.7, 94.7), (-1, 0, 0)), revolution_arc=F4_T72_ANGLE, mode=Mode.SUBTRACT)


solid = f1_6.part
